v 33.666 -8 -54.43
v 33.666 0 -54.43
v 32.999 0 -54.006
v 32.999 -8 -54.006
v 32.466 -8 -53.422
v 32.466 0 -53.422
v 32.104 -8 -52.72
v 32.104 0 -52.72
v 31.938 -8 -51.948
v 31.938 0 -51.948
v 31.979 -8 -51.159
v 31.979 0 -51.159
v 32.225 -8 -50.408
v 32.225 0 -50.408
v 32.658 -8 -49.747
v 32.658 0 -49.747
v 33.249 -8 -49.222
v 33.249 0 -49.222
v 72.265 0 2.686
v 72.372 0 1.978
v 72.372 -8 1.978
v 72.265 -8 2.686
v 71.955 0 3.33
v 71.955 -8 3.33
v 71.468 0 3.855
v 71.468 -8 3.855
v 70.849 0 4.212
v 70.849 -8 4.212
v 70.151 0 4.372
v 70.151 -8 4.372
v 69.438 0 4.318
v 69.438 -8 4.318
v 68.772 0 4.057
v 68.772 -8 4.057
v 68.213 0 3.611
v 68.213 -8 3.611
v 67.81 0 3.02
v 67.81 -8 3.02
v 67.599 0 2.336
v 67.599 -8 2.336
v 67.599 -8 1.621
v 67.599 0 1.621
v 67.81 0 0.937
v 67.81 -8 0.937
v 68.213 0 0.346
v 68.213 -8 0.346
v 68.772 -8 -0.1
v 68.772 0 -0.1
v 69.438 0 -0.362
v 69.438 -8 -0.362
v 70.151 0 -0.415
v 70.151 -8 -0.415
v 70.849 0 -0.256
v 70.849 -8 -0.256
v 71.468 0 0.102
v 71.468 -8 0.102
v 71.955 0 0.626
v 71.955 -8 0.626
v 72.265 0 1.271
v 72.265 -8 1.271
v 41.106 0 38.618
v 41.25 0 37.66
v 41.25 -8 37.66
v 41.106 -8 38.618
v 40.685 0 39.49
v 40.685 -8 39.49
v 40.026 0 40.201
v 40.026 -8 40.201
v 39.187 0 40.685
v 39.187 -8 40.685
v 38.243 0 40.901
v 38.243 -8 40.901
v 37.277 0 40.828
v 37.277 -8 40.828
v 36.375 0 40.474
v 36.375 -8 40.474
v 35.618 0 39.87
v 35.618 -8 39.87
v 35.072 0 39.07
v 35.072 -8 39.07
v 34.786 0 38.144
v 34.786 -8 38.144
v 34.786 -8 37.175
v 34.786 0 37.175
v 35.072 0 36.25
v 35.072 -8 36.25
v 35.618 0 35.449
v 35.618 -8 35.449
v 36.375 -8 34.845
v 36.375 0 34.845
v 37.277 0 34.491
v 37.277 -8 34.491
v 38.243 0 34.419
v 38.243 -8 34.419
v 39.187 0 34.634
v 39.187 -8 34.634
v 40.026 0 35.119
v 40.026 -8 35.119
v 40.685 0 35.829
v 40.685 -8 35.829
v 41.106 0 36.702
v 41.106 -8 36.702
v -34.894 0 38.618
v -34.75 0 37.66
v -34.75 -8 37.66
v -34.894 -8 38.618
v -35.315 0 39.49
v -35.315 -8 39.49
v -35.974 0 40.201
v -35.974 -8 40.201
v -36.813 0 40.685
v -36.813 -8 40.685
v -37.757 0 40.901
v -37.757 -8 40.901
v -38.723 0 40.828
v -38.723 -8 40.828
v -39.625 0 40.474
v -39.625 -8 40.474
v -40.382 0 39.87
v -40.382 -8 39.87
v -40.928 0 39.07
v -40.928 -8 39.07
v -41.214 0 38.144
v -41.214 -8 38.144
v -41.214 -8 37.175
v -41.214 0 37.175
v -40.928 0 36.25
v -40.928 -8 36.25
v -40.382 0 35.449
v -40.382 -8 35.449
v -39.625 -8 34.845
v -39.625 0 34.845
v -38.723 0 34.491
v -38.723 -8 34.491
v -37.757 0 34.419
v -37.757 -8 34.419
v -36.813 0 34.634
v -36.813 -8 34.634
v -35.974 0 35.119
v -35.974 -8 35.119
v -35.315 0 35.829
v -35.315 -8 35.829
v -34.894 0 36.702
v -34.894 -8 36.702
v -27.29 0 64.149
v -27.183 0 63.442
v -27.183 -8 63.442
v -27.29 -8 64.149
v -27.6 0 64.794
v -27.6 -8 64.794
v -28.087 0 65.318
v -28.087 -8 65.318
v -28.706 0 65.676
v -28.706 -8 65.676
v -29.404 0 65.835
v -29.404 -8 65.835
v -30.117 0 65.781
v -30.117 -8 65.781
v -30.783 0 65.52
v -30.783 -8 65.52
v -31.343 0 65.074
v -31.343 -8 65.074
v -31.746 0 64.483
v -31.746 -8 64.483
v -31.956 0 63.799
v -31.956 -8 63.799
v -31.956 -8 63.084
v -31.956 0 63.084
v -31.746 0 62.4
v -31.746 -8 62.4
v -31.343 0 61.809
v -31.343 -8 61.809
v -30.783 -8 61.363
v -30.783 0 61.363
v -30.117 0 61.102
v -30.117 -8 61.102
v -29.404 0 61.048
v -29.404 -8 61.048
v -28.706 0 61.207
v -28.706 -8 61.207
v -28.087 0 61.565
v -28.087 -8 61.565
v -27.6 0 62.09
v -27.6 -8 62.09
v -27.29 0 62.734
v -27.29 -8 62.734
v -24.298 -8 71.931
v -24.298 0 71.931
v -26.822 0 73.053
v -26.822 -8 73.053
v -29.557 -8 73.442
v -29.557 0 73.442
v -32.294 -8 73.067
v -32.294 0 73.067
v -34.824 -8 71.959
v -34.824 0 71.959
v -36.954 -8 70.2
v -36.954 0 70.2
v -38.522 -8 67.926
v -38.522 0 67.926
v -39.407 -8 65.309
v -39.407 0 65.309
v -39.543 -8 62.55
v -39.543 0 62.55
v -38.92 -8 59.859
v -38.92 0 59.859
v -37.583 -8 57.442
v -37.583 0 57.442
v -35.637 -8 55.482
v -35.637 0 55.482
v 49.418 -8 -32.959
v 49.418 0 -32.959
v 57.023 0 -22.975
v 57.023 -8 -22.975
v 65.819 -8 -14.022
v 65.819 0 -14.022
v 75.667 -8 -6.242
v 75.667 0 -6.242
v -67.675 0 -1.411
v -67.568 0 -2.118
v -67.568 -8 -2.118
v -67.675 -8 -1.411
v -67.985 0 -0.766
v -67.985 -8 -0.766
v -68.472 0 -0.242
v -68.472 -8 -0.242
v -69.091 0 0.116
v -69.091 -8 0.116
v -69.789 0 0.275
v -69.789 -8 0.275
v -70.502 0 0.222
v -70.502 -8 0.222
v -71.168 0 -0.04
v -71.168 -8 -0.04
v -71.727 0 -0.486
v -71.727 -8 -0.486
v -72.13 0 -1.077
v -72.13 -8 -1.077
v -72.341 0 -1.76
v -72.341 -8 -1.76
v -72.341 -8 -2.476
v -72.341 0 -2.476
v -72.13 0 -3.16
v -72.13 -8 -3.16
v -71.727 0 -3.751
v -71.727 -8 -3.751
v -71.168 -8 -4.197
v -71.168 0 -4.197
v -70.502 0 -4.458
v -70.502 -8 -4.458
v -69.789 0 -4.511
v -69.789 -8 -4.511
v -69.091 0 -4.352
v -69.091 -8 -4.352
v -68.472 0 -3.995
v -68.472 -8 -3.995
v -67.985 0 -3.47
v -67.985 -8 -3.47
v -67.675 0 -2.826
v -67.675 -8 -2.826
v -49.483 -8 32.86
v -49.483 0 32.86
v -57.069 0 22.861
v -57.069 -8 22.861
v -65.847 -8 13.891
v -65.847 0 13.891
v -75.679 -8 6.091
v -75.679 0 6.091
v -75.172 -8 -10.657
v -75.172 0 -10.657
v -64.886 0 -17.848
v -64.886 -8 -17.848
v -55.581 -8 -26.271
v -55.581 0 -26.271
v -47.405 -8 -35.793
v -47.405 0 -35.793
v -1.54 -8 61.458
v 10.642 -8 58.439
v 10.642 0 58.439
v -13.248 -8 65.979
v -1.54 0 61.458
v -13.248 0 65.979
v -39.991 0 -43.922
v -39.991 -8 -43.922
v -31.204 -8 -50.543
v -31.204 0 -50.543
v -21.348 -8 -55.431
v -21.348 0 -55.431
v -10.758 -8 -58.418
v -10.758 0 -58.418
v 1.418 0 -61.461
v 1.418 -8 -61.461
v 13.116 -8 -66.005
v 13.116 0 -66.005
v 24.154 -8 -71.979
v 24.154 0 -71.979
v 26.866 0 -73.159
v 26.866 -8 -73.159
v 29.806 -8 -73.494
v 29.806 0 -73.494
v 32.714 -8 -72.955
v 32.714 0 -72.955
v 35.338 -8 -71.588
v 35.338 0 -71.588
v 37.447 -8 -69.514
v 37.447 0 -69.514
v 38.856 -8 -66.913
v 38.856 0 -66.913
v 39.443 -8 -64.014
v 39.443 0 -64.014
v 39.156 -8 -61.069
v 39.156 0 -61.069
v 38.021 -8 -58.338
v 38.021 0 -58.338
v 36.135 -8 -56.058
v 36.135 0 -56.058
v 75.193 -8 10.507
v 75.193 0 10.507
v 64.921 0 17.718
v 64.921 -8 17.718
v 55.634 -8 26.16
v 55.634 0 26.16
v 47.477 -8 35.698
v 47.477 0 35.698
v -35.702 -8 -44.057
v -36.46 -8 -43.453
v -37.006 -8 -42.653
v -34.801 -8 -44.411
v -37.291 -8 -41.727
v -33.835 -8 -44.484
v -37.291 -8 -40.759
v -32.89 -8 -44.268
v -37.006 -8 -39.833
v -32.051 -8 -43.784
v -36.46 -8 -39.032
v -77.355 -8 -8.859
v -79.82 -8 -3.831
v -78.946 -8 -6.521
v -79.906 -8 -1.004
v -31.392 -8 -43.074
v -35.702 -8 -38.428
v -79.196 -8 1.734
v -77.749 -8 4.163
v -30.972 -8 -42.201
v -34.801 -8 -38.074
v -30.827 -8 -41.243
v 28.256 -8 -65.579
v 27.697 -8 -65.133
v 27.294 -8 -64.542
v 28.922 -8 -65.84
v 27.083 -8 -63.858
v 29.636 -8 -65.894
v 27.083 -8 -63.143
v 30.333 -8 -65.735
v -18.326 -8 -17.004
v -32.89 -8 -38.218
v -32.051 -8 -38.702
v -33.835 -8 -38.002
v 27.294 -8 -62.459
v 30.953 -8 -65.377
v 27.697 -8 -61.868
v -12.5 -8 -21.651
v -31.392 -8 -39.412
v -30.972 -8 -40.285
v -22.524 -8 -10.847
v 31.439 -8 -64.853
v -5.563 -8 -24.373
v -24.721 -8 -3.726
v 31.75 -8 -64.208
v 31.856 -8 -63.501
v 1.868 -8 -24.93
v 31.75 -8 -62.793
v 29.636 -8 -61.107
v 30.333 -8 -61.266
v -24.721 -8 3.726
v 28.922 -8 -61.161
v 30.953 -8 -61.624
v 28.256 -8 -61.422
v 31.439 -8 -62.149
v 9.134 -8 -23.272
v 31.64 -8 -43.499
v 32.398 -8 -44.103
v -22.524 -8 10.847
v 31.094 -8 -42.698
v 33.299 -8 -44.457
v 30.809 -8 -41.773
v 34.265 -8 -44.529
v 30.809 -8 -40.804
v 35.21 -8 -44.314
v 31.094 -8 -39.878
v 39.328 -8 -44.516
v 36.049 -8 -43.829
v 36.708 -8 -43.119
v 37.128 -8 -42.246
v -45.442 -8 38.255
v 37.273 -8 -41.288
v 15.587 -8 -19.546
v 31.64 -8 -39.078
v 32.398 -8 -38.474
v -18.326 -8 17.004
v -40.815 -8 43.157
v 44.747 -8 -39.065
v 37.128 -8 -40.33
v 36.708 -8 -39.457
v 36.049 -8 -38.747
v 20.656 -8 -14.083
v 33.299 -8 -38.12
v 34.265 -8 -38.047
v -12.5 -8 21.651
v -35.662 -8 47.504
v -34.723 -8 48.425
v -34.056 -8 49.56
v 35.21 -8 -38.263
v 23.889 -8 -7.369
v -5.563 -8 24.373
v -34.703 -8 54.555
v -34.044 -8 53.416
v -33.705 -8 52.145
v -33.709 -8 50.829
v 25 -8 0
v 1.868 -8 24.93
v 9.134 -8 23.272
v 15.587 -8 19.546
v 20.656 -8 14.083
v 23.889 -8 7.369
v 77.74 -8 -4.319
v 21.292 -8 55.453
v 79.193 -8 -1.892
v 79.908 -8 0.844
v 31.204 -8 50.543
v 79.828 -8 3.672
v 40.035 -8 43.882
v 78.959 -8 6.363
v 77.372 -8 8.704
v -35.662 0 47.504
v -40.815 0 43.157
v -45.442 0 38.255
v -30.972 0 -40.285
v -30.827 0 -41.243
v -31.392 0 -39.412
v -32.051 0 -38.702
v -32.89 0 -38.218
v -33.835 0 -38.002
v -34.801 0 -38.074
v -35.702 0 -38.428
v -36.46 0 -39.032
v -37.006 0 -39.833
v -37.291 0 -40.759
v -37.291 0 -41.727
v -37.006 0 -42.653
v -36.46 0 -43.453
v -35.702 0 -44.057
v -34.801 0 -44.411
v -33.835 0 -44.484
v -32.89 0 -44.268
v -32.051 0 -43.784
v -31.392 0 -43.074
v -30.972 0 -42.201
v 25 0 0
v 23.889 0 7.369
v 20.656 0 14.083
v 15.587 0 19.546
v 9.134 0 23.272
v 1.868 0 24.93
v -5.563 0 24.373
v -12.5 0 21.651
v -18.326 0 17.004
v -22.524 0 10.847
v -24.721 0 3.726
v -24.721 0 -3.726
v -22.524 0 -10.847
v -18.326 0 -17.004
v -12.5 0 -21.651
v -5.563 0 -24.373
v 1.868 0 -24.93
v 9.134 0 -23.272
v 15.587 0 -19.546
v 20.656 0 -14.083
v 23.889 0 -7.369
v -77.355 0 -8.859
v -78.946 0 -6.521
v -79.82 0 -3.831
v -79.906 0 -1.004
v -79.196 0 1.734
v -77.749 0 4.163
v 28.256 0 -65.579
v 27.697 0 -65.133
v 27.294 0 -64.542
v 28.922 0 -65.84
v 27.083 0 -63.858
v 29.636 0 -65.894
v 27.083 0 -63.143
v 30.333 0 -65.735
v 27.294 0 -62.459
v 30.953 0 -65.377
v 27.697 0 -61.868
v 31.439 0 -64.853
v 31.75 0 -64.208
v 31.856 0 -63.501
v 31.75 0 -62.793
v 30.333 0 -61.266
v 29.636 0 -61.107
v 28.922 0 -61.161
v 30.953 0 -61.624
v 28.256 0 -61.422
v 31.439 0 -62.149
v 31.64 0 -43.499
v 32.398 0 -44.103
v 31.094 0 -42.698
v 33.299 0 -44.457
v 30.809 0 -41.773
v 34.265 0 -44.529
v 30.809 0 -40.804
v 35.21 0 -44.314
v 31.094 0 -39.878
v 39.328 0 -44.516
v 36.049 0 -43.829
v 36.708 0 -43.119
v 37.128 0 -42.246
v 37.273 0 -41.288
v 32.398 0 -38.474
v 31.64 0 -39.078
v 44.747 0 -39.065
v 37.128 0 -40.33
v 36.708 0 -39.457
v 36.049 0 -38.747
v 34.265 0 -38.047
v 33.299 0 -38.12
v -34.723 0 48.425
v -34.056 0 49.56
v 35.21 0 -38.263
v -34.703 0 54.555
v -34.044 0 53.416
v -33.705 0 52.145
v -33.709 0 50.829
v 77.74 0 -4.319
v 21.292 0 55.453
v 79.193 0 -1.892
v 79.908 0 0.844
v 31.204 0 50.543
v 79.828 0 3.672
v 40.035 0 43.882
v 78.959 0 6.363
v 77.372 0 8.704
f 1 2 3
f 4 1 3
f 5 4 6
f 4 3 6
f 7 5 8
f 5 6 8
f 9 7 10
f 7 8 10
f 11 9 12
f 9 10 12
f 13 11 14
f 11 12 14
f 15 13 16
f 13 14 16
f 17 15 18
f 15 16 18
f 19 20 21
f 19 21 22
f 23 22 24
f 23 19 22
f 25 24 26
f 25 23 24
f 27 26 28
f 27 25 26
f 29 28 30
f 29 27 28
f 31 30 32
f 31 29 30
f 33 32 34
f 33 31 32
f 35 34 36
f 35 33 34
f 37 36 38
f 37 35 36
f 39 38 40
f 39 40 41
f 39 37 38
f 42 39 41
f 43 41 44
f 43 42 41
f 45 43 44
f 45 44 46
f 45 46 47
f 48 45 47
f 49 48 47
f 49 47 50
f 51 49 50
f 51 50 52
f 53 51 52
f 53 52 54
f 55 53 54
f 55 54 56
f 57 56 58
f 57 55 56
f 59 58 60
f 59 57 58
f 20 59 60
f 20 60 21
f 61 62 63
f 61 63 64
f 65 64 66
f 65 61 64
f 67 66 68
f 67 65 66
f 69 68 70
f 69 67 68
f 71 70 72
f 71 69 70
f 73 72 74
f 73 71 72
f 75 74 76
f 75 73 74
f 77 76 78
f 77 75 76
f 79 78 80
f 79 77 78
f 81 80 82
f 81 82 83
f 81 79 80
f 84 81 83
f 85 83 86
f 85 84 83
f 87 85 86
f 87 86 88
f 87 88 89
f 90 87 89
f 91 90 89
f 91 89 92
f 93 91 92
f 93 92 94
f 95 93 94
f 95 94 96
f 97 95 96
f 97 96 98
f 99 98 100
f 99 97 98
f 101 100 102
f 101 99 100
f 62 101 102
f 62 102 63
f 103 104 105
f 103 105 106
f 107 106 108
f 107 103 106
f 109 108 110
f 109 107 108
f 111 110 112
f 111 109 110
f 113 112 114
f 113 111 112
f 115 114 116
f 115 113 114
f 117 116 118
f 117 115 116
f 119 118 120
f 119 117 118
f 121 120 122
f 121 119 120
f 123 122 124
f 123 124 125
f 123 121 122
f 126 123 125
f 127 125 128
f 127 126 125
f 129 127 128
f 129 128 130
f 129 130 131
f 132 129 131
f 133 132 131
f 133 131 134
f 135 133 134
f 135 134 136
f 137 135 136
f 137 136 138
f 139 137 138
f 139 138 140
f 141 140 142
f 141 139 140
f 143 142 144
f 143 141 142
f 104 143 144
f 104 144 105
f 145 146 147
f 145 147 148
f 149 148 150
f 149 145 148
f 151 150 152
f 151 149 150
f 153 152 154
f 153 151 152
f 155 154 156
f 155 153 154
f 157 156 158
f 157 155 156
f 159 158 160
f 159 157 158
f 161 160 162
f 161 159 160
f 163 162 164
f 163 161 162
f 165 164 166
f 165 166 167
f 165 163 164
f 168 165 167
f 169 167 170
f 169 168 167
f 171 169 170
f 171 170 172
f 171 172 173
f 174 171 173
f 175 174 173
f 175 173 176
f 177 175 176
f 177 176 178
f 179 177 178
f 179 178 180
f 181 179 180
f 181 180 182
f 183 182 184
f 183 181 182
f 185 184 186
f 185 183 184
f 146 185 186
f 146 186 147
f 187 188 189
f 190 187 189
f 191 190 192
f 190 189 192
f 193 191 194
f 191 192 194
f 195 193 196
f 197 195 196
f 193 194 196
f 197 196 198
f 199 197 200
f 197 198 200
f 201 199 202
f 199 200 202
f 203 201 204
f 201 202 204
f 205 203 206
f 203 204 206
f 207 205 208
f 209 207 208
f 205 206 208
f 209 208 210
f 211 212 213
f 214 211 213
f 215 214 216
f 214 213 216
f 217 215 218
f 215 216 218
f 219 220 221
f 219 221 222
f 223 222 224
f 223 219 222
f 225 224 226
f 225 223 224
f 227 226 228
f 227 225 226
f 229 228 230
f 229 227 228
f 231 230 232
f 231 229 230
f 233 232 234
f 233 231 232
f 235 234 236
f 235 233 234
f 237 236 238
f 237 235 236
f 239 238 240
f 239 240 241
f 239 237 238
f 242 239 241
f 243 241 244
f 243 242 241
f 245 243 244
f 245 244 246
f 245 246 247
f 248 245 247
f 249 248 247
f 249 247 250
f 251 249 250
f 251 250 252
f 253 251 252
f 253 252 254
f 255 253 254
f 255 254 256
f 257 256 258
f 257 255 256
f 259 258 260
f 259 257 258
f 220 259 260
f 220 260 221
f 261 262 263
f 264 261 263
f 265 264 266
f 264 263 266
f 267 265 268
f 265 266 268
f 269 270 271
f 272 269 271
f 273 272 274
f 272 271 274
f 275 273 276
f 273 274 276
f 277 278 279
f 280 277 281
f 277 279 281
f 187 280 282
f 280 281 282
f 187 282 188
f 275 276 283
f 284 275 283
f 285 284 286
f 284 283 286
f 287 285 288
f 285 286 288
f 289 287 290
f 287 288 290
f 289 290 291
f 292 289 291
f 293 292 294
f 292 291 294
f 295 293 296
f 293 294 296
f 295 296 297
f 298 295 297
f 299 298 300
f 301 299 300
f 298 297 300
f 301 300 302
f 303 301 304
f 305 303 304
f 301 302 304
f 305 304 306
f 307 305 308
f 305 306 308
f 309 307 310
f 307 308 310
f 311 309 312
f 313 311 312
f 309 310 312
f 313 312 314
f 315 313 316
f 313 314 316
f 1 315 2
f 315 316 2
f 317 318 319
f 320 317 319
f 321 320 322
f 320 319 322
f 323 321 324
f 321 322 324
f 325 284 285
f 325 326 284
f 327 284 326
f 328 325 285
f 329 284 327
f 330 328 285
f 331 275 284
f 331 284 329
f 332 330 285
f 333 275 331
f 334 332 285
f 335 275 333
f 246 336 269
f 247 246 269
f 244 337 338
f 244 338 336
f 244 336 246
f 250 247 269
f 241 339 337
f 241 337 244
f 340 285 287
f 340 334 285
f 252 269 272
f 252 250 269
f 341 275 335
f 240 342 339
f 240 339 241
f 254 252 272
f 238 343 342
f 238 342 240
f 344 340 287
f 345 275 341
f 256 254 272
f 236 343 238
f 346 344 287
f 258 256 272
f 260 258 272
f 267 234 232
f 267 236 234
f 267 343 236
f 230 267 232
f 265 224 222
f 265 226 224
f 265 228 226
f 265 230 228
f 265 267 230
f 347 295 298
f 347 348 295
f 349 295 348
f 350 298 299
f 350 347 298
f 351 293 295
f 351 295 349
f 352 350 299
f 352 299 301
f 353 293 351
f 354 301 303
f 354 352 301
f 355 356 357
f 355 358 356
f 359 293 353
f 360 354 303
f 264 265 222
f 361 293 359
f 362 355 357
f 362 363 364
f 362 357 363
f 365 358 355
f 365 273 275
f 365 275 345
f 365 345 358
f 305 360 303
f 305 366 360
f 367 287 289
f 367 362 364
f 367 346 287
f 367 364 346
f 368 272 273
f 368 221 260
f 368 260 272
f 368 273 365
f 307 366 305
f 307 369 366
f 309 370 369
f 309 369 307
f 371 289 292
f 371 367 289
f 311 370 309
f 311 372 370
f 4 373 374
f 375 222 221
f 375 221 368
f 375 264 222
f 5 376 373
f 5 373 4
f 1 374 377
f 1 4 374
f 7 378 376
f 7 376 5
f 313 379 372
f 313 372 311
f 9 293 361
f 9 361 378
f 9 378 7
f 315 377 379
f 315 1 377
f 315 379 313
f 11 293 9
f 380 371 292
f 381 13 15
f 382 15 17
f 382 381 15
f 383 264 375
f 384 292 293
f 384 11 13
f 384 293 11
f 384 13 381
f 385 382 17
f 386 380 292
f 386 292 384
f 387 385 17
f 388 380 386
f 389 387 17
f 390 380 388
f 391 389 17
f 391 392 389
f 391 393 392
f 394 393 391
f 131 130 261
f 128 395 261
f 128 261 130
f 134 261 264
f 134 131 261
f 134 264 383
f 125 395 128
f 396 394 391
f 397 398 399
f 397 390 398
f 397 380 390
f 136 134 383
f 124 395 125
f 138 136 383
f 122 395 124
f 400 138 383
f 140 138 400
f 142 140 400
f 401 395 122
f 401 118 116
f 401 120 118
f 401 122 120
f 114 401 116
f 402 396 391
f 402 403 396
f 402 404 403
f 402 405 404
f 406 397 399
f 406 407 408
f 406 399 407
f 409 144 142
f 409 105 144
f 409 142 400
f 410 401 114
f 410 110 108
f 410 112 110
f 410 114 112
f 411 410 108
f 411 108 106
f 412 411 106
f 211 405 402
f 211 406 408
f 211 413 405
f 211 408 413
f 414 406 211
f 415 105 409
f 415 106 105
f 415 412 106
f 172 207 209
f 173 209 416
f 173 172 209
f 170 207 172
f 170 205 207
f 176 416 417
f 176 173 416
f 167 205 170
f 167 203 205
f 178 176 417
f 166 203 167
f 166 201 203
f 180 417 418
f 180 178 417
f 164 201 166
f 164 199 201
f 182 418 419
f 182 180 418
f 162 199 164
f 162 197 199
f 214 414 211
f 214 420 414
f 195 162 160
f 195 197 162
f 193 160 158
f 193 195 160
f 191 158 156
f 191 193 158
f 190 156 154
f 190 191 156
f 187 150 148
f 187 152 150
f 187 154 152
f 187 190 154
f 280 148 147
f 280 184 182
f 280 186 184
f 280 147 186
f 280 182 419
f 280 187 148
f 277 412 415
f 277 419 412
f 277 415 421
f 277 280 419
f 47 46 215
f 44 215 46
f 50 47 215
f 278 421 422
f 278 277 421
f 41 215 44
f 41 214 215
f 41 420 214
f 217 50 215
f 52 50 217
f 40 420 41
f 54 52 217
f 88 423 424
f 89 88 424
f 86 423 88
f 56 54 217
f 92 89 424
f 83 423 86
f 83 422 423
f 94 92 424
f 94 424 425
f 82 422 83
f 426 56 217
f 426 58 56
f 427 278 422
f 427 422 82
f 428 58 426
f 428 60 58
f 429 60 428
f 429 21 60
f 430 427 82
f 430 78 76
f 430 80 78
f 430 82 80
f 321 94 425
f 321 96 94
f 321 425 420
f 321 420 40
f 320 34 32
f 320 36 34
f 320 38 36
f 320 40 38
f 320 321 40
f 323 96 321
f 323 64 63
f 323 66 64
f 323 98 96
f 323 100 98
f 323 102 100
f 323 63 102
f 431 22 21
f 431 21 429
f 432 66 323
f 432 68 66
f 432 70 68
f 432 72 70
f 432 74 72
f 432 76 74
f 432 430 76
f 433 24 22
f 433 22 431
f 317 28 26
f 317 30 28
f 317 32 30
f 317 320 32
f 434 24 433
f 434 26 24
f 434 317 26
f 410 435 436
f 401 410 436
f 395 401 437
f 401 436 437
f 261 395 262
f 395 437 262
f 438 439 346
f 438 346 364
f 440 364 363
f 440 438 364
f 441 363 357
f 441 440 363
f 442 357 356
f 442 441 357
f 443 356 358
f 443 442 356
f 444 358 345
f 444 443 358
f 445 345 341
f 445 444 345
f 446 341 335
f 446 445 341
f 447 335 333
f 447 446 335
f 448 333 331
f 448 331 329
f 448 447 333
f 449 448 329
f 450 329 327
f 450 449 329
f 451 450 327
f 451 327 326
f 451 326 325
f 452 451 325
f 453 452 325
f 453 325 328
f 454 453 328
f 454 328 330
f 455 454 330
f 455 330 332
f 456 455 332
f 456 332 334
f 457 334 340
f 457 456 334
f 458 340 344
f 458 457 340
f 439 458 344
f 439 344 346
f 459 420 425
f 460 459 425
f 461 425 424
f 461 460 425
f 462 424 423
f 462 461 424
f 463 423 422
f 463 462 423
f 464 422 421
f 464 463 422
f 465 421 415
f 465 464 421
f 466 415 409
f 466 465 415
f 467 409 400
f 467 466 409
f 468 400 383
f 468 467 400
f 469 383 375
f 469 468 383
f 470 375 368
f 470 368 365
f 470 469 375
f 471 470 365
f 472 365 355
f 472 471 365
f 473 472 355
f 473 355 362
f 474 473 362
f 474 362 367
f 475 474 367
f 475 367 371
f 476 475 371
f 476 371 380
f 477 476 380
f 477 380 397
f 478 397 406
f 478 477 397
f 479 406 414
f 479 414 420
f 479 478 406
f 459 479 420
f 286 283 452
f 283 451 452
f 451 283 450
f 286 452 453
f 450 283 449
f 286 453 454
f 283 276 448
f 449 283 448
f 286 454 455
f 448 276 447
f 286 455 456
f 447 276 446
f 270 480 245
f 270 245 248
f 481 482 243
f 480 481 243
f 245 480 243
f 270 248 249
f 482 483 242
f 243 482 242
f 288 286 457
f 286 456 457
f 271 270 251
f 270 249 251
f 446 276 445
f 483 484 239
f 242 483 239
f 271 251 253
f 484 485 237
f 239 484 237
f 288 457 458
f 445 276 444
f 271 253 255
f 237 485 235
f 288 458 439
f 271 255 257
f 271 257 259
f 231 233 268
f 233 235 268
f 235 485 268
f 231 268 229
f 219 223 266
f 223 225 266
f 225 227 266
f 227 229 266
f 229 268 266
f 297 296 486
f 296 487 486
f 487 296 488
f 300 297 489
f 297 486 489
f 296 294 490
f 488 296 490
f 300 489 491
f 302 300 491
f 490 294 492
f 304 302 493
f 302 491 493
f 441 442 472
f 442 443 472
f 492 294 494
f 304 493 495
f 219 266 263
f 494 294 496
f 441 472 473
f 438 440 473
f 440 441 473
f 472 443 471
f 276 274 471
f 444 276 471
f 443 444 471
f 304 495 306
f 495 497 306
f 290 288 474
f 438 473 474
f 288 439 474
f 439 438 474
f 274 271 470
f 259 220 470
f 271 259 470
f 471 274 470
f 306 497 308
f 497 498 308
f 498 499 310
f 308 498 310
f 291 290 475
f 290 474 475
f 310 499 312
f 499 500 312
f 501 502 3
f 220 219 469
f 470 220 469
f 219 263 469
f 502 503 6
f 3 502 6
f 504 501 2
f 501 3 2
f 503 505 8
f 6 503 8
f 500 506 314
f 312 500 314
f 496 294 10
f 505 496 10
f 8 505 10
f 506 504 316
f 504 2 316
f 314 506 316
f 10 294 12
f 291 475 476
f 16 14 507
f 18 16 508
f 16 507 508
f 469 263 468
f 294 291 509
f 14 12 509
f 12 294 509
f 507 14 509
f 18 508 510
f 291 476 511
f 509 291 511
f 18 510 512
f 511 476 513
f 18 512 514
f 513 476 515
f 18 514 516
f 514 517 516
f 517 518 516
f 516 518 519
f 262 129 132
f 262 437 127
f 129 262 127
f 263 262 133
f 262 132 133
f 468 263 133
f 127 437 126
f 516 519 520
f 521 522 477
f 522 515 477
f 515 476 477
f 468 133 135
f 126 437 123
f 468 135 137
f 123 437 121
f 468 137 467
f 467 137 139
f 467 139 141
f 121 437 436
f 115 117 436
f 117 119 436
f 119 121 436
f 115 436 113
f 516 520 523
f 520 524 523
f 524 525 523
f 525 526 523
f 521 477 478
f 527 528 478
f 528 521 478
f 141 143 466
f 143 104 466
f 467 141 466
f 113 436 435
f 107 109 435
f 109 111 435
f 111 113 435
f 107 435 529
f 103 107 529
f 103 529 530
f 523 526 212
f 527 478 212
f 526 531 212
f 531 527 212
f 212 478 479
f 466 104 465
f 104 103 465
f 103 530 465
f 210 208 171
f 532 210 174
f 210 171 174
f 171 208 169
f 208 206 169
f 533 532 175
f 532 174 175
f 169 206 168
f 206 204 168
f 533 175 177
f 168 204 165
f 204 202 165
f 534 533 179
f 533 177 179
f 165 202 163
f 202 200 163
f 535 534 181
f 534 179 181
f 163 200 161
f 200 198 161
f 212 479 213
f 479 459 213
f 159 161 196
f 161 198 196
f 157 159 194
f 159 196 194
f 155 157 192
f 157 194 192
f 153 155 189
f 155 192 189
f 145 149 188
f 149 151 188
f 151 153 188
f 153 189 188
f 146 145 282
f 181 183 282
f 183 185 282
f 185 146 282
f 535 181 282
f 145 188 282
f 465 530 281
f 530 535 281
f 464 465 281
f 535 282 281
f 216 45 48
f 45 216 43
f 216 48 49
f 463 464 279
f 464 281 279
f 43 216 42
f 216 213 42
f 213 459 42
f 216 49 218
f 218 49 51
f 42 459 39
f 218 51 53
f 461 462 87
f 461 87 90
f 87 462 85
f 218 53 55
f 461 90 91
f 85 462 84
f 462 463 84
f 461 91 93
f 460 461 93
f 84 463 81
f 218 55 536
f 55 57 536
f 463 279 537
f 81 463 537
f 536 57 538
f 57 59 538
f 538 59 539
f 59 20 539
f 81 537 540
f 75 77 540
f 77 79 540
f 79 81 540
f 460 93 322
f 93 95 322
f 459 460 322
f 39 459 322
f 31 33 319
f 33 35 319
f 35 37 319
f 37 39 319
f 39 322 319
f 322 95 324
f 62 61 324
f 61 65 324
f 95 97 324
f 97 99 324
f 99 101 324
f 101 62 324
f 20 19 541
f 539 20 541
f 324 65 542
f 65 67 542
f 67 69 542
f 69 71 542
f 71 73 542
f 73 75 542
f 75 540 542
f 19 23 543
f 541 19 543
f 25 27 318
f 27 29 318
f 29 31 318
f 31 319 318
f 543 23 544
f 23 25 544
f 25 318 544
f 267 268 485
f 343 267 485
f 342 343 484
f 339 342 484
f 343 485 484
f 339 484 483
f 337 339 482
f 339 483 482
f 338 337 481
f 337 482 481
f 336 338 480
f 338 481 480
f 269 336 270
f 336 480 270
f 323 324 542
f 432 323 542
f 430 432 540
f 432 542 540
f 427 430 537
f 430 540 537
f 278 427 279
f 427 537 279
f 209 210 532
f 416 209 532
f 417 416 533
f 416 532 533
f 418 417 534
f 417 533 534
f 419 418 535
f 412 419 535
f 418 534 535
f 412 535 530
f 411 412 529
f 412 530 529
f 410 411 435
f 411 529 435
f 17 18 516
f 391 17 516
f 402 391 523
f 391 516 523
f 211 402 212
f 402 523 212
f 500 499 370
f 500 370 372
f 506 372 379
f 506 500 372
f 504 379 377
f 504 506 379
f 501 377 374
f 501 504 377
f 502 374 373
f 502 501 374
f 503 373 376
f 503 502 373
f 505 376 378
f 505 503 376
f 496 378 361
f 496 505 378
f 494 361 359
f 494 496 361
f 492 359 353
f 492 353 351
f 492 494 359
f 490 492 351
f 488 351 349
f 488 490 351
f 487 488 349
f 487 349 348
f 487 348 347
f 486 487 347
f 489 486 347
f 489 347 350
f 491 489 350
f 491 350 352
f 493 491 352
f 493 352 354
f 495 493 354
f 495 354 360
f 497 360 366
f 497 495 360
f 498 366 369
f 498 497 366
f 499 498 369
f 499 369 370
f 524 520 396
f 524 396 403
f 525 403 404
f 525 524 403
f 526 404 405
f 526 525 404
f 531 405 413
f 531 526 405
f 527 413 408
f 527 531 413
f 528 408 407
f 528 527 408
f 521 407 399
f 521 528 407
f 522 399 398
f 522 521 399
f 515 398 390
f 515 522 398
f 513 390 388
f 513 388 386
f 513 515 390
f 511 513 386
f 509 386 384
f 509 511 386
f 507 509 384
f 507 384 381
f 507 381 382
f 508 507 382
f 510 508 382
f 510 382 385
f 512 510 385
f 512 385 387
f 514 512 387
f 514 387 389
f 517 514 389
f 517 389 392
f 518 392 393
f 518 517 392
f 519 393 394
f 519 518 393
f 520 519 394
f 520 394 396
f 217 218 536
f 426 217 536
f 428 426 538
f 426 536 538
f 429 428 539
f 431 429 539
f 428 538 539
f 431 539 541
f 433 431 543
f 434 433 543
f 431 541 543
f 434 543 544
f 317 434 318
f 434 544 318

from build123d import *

# Parameters (mm, degrees)
F0_R     = 3.25
F0_R_2   = 2.4
F0_R_3   = 25
F1_DEPTH = 8


with BuildPart() as f1:
    # F0 (on Front) → F1 (new body)
    with BuildSketch(Plane.XZ):
        with BuildLine():
            ThreePointArc((-35.636863, 55.482015), (-33.663679, 51.486611), (-35.661818, 47.503628))
            ThreePointArc((-35.661818, 47.503628), (-43.197676, 40.771569), (-49.483404, 32.859591))
            ThreePointArc((-49.483404, 32.859591), (-61.316735, 18.237762), (-75.678931, 6.090625))
            ThreePointArc((-75.678931, 6.090625), (-79.963365, -2.420787), (-75.171905, -10.657439))
            ThreePointArc((-75.171905, -10.657439), (-60.101207, -21.913533), (-47.405043, -35.792763))
            ThreePointArc((-47.405043, -35.792763), (-31.204449, -50.54347), (-10.758408, -58.417606))
            ThreePointArc((-10.758408, -58.417606), (7.338328, -63.549248), (24.153913, -71.979058))
            ThreePointArc((24.153913, -71.979058), (38.248014, -68.265692), (33.665686, -54.429687))
            ThreePointArc((33.665686, -54.429687), (31.938042, -51.947575), (33.24924, -49.222435))
            ThreePointArc((33.24924, -49.222435), (42.12576, -41.878161), (49.41758, -32.958501))
            ThreePointArc((49.41758, -32.958501), (61.280134, -18.36037), (75.666598, -6.241984))
            ThreePointArc((75.666598, -6.241984), (79.968047, 2.260842), (75.193072, 10.507061))
            ThreePointArc((75.193072, 10.507061), (60.144918, 21.793276), (47.47654, 35.697873))
            ThreePointArc((47.47654, 35.697873), (31.204449, 50.54347), (10.641541, 58.439008))
            ThreePointArc((10.641541, 58.439008), (-7.465423, 63.534443), (-24.297835, 71.930602))
            ThreePointArc((-24.297835, 71.930602), (-37.816535, 69.117238), (-35.636863, 55.482015))
        make_face()
        with Locations((-34.077461, -41.242898)):
            Circle(F0_R, mode=Mode.SUBTRACT)
        with Locations((-69.967945, -2.118189)):
            Circle(F0_R_2, mode=Mode.SUBTRACT)
        with Locations((29.456325, -63.50059)):
            Circle(F0_R_2, mode=Mode.SUBTRACT)
        with Locations((34.022539, -41.288217)):
            Circle(F0_R, mode=Mode.SUBTRACT)
        Circle(F0_R_3, mode=Mode.SUBTRACT)
        with Locations((-38, 37.65966)):
            Circle(F0_R, mode=Mode.SUBTRACT)
        with Locations((-29.583278, 63.441545)):
            Circle(F0_R_2, mode=Mode.SUBTRACT)
        with Locations((69.972041, 1.978236)):
            Circle(F0_R_2, mode=Mode.SUBTRACT)
        with Locations((38, 37.65966)):
            Circle(F0_R, mode=Mode.SUBTRACT)
    extrude(amount=F1_DEPTH)


solid = f1.part
